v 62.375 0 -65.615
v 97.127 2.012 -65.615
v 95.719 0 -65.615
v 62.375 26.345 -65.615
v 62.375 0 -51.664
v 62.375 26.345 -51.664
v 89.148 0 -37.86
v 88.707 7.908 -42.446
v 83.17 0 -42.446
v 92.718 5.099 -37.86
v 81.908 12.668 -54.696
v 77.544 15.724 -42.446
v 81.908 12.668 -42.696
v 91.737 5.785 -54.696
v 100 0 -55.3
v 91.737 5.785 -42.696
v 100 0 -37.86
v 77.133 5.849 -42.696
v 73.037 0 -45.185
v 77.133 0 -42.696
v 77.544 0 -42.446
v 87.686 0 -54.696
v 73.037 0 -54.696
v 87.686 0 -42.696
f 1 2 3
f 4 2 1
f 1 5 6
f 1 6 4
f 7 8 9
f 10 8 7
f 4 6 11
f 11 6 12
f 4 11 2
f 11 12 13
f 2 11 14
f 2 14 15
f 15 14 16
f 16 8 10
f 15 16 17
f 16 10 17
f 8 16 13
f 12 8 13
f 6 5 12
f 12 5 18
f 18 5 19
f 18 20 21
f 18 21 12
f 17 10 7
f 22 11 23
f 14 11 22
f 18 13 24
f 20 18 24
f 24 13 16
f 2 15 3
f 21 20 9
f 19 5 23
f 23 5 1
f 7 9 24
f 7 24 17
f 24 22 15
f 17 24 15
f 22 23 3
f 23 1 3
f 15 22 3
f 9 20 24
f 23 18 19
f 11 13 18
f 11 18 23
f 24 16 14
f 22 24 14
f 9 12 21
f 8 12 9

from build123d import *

# Parameters (mm, degrees)
SKIZZE1_W                       = 100
SKIZZE1_H                       = 100
AUFSATZ_LINEAR_AUSTRAGEN1_DEPTH = 50
SKIZZE2_OUTSIDE_W               = 132
SKIZZE2_OUTSIDE_H               = 82
SCHNITT_LINEAR_AUSTRAGEN1_DEPTH = 101
SKIZZE3_OUTSIDE_W               = 142.594
SKIZZE3_OUTSIDE_H               = 132
SKIZZE3_OUTSIDE_W_2             = 12
SKIZZE3_OUTSIDE_H_2             = 12
SCHNITT_LINEAR_AUSTRAGEN2_DEPTH = 58.357643635
SCHNITT_LINEAR_AUSTRAGEN3_DEPTH = 50


with BuildPart() as part:
    # Skizze1 → Aufsatz-Linear austragen1 (new body)
    with BuildSketch(Plane(origin=(0, 0, 0), x_dir=(1, 0, 0), z_dir=(0, 1, 0))):
        with Locations((50, 50)):
            Rectangle(SKIZZE1_W, SKIZZE1_H)
    extrude(amount=AUFSATZ_LINEAR_AUSTRAGEN1_DEPTH)

    # Skizze2 outside → Schnitt-Linear austragen1 (cut, through all)
    with BuildSketch(Plane.XY):
        with Locations((50, 25)):
            Rectangle(SKIZZE2_OUTSIDE_W, SKIZZE2_OUTSIDE_H)
        Polygon((0, 0), (0, 70.020753821), (100, 0), align=None, mode=Mode.SUBTRACT)
    extrude(amount=-SCHNITT_LINEAR_AUSTRAGEN1_DEPTH, mode=Mode.SUBTRACT)

    # Skizze3 outside → Schnitt-Linear austragen2 (cut, through all)
    with BuildSketch(Plane(origin=(32.898992834, 46.984631039, 0), x_dir=(0.819152044, -0.573576436, 0), z_dir=(0.573576436, 0.819152044, 0))):
        with Locations((26.618, 50)):
            Rectangle(SKIZZE3_OUTSIDE_W, SKIZZE3_OUTSIDE_H)
        Polygon((81.915204429, 37.859878609), (81.915204429, 55.30029111), (78.408084137, 65.614823426), (35.984131413, 65.614823426), (35.984131413, 51.664109902), (54.501889142, 42.446196436), (68.128544963, 42.446196436), (73.025747531, 37.859878609), align=None, mode=Mode.SUBTRACT)
        with Locations((65.828544963, 48.696196436)):
            Rectangle(SKIZZE3_OUTSIDE_W_2, SKIZZE3_OUTSIDE_H_2)
    extrude(amount=-SCHNITT_LINEAR_AUSTRAGEN2_DEPTH, mode=Mode.SUBTRACT)

    # Skizze4 → Schnitt-Linear austragen3 (cut)
    with BuildSketch(Plane(origin=(0, 0, 0), x_dir=(1, 0, 0), z_dir=(0, 1, 0))):
        Polygon((62.375467643, 65.614823426), (62.375467643, 51.664109902), (77.544326742, 42.446196436), (62.375467643, 16.747939689), (28.386649176, 16.747939689), (28.386649176, 99.890537097), (62.375467643, 99.890537097), align=None)
    extrude(amount=SCHNITT_LINEAR_AUSTRAGEN3_DEPTH, mode=Mode.SUBTRACT)


solid = part.part
